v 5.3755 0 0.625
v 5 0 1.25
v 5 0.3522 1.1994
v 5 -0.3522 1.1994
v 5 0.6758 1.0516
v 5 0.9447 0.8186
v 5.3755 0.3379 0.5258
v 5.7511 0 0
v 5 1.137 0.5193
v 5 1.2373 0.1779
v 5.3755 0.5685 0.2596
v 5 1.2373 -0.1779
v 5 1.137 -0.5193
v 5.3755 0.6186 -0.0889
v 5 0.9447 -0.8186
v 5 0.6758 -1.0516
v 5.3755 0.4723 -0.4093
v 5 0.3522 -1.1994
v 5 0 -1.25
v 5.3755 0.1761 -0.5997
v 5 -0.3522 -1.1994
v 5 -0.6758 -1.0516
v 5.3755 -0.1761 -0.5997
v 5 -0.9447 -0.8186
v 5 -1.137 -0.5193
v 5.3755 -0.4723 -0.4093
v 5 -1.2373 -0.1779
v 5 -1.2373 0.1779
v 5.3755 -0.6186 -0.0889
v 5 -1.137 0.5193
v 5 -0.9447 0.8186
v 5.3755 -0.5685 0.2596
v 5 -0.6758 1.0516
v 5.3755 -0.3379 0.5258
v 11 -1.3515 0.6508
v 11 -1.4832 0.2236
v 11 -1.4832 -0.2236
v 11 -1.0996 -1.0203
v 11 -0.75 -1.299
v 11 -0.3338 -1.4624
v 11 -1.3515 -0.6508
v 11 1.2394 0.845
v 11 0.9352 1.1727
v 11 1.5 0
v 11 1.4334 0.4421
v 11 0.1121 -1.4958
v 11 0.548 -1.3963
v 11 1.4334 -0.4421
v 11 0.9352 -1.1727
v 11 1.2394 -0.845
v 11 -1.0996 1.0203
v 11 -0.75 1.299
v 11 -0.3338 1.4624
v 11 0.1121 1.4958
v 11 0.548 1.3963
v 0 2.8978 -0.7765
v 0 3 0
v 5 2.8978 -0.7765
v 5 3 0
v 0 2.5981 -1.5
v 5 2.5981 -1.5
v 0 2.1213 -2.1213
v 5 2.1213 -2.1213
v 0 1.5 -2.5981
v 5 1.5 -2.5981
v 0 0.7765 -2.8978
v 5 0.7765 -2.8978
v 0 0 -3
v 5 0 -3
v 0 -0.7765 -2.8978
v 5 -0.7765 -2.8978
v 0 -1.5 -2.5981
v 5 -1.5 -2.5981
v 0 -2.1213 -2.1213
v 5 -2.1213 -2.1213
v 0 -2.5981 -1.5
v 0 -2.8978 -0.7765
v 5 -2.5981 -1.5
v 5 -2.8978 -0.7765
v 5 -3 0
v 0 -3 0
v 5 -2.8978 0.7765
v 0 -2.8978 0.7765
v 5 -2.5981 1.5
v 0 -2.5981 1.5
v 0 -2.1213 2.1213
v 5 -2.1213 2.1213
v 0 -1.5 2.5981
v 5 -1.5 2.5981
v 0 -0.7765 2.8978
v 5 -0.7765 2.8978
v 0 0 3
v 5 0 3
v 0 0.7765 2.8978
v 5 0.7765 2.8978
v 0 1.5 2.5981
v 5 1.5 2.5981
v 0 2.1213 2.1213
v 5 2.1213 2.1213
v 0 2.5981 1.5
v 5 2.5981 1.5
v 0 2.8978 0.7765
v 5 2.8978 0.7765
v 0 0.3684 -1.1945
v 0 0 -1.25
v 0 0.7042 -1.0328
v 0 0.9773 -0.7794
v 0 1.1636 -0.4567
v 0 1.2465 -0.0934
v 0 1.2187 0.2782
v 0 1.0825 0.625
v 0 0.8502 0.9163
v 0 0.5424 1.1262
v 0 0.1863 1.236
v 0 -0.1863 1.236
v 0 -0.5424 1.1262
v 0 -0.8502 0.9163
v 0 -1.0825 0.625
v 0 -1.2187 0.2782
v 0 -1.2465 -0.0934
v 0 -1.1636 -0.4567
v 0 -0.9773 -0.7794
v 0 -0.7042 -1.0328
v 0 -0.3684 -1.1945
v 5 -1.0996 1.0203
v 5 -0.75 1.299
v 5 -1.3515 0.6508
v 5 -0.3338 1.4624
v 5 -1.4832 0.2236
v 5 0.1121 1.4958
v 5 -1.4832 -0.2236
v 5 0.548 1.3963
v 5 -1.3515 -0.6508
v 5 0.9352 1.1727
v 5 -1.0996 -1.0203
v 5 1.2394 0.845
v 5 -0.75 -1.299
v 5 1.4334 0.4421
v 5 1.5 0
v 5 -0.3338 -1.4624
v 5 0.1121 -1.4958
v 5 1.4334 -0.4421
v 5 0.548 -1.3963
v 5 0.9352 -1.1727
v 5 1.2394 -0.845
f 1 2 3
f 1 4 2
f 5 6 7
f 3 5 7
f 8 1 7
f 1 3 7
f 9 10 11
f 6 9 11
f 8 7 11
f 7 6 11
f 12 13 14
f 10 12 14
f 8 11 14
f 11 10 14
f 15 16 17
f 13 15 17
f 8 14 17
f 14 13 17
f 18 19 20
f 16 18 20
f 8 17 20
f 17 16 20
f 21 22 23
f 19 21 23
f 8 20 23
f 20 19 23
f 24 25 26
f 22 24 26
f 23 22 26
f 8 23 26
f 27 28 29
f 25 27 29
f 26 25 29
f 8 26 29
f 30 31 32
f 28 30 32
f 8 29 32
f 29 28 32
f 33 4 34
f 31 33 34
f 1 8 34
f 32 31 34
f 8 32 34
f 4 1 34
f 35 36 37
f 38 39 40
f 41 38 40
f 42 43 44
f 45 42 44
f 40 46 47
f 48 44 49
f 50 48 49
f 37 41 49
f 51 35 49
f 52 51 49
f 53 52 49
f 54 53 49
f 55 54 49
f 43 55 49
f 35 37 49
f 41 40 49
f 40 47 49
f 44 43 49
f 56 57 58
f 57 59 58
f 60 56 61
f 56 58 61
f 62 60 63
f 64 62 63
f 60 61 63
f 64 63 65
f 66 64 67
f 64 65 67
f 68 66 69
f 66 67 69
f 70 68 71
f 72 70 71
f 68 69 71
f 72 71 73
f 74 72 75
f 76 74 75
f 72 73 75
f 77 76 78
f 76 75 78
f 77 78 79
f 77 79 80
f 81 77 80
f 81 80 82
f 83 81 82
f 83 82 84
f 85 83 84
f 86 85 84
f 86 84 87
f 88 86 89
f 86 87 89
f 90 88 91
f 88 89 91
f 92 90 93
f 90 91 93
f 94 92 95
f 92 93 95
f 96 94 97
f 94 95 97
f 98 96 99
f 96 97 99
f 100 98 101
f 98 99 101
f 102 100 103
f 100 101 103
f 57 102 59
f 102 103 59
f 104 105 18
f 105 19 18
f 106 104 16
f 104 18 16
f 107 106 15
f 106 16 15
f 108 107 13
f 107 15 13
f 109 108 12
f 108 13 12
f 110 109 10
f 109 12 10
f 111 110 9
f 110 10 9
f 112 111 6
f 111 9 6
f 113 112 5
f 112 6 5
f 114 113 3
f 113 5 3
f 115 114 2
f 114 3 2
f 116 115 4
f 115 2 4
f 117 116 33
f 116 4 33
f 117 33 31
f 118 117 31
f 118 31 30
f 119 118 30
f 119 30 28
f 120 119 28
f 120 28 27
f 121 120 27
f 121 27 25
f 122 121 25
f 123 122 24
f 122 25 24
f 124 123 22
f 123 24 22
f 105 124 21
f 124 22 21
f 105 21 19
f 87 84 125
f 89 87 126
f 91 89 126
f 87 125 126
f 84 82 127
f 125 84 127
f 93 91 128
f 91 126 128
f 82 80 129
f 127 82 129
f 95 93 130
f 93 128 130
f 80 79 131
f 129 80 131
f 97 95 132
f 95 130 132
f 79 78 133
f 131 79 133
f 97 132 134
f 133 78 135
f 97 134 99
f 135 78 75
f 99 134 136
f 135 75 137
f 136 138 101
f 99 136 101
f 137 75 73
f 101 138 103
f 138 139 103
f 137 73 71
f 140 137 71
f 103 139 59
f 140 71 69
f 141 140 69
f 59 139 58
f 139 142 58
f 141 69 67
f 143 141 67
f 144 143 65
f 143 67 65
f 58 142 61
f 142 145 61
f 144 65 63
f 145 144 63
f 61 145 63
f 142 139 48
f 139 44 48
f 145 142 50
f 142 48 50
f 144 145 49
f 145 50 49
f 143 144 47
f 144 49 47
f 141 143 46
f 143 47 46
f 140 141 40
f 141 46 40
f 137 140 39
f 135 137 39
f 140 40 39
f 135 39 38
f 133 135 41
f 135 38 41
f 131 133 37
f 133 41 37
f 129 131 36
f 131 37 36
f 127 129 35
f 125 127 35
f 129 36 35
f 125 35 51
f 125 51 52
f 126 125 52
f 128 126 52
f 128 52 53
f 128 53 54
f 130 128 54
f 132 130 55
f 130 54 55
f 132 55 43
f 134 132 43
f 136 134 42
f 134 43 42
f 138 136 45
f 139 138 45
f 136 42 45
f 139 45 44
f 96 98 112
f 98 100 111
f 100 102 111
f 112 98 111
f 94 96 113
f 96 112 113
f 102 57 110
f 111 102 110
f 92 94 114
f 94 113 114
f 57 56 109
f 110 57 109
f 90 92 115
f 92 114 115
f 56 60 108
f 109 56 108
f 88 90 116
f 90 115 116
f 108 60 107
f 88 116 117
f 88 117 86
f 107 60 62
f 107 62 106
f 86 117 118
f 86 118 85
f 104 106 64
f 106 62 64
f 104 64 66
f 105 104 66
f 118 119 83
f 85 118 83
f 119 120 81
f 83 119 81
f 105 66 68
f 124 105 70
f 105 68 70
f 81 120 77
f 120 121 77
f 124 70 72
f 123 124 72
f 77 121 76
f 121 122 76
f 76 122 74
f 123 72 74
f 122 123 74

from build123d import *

# Parameters (mm, degrees)
M3_GEWINDEBOHRUNG1_D     = 2.5
M3_GEWINDEBOHRUNG1_DEPTH = 5
M3_GEWINDEBOHRUNG1_TIP   = 0.751075774


with BuildPart() as part:
    # Skizze1 → Rotation1 (revolve)
    with BuildSketch(Plane.XY):
        Polygon((0, 3), (5, 3), (5, 1.5), (11, 1.5), (11, 0), (0, 0), align=None)
    revolve(axis=Axis((11, 0, 0), (-1, 0, 0)))

    # M3 Gewindebohrung1
    with Locations(Plane.ZY):
        with Locations((0, 0)):
            Hole(M3_GEWINDEBOHRUNG1_D / 2, depth=M3_GEWINDEBOHRUNG1_DEPTH)
            with Locations((0, 0, -(M3_GEWINDEBOHRUNG1_DEPTH + M3_GEWINDEBOHRUNG1_TIP / 2))):  # 118° drill point
                Cone(0, M3_GEWINDEBOHRUNG1_D / 2, M3_GEWINDEBOHRUNG1_TIP, mode=Mode.SUBTRACT)


solid = part.part
